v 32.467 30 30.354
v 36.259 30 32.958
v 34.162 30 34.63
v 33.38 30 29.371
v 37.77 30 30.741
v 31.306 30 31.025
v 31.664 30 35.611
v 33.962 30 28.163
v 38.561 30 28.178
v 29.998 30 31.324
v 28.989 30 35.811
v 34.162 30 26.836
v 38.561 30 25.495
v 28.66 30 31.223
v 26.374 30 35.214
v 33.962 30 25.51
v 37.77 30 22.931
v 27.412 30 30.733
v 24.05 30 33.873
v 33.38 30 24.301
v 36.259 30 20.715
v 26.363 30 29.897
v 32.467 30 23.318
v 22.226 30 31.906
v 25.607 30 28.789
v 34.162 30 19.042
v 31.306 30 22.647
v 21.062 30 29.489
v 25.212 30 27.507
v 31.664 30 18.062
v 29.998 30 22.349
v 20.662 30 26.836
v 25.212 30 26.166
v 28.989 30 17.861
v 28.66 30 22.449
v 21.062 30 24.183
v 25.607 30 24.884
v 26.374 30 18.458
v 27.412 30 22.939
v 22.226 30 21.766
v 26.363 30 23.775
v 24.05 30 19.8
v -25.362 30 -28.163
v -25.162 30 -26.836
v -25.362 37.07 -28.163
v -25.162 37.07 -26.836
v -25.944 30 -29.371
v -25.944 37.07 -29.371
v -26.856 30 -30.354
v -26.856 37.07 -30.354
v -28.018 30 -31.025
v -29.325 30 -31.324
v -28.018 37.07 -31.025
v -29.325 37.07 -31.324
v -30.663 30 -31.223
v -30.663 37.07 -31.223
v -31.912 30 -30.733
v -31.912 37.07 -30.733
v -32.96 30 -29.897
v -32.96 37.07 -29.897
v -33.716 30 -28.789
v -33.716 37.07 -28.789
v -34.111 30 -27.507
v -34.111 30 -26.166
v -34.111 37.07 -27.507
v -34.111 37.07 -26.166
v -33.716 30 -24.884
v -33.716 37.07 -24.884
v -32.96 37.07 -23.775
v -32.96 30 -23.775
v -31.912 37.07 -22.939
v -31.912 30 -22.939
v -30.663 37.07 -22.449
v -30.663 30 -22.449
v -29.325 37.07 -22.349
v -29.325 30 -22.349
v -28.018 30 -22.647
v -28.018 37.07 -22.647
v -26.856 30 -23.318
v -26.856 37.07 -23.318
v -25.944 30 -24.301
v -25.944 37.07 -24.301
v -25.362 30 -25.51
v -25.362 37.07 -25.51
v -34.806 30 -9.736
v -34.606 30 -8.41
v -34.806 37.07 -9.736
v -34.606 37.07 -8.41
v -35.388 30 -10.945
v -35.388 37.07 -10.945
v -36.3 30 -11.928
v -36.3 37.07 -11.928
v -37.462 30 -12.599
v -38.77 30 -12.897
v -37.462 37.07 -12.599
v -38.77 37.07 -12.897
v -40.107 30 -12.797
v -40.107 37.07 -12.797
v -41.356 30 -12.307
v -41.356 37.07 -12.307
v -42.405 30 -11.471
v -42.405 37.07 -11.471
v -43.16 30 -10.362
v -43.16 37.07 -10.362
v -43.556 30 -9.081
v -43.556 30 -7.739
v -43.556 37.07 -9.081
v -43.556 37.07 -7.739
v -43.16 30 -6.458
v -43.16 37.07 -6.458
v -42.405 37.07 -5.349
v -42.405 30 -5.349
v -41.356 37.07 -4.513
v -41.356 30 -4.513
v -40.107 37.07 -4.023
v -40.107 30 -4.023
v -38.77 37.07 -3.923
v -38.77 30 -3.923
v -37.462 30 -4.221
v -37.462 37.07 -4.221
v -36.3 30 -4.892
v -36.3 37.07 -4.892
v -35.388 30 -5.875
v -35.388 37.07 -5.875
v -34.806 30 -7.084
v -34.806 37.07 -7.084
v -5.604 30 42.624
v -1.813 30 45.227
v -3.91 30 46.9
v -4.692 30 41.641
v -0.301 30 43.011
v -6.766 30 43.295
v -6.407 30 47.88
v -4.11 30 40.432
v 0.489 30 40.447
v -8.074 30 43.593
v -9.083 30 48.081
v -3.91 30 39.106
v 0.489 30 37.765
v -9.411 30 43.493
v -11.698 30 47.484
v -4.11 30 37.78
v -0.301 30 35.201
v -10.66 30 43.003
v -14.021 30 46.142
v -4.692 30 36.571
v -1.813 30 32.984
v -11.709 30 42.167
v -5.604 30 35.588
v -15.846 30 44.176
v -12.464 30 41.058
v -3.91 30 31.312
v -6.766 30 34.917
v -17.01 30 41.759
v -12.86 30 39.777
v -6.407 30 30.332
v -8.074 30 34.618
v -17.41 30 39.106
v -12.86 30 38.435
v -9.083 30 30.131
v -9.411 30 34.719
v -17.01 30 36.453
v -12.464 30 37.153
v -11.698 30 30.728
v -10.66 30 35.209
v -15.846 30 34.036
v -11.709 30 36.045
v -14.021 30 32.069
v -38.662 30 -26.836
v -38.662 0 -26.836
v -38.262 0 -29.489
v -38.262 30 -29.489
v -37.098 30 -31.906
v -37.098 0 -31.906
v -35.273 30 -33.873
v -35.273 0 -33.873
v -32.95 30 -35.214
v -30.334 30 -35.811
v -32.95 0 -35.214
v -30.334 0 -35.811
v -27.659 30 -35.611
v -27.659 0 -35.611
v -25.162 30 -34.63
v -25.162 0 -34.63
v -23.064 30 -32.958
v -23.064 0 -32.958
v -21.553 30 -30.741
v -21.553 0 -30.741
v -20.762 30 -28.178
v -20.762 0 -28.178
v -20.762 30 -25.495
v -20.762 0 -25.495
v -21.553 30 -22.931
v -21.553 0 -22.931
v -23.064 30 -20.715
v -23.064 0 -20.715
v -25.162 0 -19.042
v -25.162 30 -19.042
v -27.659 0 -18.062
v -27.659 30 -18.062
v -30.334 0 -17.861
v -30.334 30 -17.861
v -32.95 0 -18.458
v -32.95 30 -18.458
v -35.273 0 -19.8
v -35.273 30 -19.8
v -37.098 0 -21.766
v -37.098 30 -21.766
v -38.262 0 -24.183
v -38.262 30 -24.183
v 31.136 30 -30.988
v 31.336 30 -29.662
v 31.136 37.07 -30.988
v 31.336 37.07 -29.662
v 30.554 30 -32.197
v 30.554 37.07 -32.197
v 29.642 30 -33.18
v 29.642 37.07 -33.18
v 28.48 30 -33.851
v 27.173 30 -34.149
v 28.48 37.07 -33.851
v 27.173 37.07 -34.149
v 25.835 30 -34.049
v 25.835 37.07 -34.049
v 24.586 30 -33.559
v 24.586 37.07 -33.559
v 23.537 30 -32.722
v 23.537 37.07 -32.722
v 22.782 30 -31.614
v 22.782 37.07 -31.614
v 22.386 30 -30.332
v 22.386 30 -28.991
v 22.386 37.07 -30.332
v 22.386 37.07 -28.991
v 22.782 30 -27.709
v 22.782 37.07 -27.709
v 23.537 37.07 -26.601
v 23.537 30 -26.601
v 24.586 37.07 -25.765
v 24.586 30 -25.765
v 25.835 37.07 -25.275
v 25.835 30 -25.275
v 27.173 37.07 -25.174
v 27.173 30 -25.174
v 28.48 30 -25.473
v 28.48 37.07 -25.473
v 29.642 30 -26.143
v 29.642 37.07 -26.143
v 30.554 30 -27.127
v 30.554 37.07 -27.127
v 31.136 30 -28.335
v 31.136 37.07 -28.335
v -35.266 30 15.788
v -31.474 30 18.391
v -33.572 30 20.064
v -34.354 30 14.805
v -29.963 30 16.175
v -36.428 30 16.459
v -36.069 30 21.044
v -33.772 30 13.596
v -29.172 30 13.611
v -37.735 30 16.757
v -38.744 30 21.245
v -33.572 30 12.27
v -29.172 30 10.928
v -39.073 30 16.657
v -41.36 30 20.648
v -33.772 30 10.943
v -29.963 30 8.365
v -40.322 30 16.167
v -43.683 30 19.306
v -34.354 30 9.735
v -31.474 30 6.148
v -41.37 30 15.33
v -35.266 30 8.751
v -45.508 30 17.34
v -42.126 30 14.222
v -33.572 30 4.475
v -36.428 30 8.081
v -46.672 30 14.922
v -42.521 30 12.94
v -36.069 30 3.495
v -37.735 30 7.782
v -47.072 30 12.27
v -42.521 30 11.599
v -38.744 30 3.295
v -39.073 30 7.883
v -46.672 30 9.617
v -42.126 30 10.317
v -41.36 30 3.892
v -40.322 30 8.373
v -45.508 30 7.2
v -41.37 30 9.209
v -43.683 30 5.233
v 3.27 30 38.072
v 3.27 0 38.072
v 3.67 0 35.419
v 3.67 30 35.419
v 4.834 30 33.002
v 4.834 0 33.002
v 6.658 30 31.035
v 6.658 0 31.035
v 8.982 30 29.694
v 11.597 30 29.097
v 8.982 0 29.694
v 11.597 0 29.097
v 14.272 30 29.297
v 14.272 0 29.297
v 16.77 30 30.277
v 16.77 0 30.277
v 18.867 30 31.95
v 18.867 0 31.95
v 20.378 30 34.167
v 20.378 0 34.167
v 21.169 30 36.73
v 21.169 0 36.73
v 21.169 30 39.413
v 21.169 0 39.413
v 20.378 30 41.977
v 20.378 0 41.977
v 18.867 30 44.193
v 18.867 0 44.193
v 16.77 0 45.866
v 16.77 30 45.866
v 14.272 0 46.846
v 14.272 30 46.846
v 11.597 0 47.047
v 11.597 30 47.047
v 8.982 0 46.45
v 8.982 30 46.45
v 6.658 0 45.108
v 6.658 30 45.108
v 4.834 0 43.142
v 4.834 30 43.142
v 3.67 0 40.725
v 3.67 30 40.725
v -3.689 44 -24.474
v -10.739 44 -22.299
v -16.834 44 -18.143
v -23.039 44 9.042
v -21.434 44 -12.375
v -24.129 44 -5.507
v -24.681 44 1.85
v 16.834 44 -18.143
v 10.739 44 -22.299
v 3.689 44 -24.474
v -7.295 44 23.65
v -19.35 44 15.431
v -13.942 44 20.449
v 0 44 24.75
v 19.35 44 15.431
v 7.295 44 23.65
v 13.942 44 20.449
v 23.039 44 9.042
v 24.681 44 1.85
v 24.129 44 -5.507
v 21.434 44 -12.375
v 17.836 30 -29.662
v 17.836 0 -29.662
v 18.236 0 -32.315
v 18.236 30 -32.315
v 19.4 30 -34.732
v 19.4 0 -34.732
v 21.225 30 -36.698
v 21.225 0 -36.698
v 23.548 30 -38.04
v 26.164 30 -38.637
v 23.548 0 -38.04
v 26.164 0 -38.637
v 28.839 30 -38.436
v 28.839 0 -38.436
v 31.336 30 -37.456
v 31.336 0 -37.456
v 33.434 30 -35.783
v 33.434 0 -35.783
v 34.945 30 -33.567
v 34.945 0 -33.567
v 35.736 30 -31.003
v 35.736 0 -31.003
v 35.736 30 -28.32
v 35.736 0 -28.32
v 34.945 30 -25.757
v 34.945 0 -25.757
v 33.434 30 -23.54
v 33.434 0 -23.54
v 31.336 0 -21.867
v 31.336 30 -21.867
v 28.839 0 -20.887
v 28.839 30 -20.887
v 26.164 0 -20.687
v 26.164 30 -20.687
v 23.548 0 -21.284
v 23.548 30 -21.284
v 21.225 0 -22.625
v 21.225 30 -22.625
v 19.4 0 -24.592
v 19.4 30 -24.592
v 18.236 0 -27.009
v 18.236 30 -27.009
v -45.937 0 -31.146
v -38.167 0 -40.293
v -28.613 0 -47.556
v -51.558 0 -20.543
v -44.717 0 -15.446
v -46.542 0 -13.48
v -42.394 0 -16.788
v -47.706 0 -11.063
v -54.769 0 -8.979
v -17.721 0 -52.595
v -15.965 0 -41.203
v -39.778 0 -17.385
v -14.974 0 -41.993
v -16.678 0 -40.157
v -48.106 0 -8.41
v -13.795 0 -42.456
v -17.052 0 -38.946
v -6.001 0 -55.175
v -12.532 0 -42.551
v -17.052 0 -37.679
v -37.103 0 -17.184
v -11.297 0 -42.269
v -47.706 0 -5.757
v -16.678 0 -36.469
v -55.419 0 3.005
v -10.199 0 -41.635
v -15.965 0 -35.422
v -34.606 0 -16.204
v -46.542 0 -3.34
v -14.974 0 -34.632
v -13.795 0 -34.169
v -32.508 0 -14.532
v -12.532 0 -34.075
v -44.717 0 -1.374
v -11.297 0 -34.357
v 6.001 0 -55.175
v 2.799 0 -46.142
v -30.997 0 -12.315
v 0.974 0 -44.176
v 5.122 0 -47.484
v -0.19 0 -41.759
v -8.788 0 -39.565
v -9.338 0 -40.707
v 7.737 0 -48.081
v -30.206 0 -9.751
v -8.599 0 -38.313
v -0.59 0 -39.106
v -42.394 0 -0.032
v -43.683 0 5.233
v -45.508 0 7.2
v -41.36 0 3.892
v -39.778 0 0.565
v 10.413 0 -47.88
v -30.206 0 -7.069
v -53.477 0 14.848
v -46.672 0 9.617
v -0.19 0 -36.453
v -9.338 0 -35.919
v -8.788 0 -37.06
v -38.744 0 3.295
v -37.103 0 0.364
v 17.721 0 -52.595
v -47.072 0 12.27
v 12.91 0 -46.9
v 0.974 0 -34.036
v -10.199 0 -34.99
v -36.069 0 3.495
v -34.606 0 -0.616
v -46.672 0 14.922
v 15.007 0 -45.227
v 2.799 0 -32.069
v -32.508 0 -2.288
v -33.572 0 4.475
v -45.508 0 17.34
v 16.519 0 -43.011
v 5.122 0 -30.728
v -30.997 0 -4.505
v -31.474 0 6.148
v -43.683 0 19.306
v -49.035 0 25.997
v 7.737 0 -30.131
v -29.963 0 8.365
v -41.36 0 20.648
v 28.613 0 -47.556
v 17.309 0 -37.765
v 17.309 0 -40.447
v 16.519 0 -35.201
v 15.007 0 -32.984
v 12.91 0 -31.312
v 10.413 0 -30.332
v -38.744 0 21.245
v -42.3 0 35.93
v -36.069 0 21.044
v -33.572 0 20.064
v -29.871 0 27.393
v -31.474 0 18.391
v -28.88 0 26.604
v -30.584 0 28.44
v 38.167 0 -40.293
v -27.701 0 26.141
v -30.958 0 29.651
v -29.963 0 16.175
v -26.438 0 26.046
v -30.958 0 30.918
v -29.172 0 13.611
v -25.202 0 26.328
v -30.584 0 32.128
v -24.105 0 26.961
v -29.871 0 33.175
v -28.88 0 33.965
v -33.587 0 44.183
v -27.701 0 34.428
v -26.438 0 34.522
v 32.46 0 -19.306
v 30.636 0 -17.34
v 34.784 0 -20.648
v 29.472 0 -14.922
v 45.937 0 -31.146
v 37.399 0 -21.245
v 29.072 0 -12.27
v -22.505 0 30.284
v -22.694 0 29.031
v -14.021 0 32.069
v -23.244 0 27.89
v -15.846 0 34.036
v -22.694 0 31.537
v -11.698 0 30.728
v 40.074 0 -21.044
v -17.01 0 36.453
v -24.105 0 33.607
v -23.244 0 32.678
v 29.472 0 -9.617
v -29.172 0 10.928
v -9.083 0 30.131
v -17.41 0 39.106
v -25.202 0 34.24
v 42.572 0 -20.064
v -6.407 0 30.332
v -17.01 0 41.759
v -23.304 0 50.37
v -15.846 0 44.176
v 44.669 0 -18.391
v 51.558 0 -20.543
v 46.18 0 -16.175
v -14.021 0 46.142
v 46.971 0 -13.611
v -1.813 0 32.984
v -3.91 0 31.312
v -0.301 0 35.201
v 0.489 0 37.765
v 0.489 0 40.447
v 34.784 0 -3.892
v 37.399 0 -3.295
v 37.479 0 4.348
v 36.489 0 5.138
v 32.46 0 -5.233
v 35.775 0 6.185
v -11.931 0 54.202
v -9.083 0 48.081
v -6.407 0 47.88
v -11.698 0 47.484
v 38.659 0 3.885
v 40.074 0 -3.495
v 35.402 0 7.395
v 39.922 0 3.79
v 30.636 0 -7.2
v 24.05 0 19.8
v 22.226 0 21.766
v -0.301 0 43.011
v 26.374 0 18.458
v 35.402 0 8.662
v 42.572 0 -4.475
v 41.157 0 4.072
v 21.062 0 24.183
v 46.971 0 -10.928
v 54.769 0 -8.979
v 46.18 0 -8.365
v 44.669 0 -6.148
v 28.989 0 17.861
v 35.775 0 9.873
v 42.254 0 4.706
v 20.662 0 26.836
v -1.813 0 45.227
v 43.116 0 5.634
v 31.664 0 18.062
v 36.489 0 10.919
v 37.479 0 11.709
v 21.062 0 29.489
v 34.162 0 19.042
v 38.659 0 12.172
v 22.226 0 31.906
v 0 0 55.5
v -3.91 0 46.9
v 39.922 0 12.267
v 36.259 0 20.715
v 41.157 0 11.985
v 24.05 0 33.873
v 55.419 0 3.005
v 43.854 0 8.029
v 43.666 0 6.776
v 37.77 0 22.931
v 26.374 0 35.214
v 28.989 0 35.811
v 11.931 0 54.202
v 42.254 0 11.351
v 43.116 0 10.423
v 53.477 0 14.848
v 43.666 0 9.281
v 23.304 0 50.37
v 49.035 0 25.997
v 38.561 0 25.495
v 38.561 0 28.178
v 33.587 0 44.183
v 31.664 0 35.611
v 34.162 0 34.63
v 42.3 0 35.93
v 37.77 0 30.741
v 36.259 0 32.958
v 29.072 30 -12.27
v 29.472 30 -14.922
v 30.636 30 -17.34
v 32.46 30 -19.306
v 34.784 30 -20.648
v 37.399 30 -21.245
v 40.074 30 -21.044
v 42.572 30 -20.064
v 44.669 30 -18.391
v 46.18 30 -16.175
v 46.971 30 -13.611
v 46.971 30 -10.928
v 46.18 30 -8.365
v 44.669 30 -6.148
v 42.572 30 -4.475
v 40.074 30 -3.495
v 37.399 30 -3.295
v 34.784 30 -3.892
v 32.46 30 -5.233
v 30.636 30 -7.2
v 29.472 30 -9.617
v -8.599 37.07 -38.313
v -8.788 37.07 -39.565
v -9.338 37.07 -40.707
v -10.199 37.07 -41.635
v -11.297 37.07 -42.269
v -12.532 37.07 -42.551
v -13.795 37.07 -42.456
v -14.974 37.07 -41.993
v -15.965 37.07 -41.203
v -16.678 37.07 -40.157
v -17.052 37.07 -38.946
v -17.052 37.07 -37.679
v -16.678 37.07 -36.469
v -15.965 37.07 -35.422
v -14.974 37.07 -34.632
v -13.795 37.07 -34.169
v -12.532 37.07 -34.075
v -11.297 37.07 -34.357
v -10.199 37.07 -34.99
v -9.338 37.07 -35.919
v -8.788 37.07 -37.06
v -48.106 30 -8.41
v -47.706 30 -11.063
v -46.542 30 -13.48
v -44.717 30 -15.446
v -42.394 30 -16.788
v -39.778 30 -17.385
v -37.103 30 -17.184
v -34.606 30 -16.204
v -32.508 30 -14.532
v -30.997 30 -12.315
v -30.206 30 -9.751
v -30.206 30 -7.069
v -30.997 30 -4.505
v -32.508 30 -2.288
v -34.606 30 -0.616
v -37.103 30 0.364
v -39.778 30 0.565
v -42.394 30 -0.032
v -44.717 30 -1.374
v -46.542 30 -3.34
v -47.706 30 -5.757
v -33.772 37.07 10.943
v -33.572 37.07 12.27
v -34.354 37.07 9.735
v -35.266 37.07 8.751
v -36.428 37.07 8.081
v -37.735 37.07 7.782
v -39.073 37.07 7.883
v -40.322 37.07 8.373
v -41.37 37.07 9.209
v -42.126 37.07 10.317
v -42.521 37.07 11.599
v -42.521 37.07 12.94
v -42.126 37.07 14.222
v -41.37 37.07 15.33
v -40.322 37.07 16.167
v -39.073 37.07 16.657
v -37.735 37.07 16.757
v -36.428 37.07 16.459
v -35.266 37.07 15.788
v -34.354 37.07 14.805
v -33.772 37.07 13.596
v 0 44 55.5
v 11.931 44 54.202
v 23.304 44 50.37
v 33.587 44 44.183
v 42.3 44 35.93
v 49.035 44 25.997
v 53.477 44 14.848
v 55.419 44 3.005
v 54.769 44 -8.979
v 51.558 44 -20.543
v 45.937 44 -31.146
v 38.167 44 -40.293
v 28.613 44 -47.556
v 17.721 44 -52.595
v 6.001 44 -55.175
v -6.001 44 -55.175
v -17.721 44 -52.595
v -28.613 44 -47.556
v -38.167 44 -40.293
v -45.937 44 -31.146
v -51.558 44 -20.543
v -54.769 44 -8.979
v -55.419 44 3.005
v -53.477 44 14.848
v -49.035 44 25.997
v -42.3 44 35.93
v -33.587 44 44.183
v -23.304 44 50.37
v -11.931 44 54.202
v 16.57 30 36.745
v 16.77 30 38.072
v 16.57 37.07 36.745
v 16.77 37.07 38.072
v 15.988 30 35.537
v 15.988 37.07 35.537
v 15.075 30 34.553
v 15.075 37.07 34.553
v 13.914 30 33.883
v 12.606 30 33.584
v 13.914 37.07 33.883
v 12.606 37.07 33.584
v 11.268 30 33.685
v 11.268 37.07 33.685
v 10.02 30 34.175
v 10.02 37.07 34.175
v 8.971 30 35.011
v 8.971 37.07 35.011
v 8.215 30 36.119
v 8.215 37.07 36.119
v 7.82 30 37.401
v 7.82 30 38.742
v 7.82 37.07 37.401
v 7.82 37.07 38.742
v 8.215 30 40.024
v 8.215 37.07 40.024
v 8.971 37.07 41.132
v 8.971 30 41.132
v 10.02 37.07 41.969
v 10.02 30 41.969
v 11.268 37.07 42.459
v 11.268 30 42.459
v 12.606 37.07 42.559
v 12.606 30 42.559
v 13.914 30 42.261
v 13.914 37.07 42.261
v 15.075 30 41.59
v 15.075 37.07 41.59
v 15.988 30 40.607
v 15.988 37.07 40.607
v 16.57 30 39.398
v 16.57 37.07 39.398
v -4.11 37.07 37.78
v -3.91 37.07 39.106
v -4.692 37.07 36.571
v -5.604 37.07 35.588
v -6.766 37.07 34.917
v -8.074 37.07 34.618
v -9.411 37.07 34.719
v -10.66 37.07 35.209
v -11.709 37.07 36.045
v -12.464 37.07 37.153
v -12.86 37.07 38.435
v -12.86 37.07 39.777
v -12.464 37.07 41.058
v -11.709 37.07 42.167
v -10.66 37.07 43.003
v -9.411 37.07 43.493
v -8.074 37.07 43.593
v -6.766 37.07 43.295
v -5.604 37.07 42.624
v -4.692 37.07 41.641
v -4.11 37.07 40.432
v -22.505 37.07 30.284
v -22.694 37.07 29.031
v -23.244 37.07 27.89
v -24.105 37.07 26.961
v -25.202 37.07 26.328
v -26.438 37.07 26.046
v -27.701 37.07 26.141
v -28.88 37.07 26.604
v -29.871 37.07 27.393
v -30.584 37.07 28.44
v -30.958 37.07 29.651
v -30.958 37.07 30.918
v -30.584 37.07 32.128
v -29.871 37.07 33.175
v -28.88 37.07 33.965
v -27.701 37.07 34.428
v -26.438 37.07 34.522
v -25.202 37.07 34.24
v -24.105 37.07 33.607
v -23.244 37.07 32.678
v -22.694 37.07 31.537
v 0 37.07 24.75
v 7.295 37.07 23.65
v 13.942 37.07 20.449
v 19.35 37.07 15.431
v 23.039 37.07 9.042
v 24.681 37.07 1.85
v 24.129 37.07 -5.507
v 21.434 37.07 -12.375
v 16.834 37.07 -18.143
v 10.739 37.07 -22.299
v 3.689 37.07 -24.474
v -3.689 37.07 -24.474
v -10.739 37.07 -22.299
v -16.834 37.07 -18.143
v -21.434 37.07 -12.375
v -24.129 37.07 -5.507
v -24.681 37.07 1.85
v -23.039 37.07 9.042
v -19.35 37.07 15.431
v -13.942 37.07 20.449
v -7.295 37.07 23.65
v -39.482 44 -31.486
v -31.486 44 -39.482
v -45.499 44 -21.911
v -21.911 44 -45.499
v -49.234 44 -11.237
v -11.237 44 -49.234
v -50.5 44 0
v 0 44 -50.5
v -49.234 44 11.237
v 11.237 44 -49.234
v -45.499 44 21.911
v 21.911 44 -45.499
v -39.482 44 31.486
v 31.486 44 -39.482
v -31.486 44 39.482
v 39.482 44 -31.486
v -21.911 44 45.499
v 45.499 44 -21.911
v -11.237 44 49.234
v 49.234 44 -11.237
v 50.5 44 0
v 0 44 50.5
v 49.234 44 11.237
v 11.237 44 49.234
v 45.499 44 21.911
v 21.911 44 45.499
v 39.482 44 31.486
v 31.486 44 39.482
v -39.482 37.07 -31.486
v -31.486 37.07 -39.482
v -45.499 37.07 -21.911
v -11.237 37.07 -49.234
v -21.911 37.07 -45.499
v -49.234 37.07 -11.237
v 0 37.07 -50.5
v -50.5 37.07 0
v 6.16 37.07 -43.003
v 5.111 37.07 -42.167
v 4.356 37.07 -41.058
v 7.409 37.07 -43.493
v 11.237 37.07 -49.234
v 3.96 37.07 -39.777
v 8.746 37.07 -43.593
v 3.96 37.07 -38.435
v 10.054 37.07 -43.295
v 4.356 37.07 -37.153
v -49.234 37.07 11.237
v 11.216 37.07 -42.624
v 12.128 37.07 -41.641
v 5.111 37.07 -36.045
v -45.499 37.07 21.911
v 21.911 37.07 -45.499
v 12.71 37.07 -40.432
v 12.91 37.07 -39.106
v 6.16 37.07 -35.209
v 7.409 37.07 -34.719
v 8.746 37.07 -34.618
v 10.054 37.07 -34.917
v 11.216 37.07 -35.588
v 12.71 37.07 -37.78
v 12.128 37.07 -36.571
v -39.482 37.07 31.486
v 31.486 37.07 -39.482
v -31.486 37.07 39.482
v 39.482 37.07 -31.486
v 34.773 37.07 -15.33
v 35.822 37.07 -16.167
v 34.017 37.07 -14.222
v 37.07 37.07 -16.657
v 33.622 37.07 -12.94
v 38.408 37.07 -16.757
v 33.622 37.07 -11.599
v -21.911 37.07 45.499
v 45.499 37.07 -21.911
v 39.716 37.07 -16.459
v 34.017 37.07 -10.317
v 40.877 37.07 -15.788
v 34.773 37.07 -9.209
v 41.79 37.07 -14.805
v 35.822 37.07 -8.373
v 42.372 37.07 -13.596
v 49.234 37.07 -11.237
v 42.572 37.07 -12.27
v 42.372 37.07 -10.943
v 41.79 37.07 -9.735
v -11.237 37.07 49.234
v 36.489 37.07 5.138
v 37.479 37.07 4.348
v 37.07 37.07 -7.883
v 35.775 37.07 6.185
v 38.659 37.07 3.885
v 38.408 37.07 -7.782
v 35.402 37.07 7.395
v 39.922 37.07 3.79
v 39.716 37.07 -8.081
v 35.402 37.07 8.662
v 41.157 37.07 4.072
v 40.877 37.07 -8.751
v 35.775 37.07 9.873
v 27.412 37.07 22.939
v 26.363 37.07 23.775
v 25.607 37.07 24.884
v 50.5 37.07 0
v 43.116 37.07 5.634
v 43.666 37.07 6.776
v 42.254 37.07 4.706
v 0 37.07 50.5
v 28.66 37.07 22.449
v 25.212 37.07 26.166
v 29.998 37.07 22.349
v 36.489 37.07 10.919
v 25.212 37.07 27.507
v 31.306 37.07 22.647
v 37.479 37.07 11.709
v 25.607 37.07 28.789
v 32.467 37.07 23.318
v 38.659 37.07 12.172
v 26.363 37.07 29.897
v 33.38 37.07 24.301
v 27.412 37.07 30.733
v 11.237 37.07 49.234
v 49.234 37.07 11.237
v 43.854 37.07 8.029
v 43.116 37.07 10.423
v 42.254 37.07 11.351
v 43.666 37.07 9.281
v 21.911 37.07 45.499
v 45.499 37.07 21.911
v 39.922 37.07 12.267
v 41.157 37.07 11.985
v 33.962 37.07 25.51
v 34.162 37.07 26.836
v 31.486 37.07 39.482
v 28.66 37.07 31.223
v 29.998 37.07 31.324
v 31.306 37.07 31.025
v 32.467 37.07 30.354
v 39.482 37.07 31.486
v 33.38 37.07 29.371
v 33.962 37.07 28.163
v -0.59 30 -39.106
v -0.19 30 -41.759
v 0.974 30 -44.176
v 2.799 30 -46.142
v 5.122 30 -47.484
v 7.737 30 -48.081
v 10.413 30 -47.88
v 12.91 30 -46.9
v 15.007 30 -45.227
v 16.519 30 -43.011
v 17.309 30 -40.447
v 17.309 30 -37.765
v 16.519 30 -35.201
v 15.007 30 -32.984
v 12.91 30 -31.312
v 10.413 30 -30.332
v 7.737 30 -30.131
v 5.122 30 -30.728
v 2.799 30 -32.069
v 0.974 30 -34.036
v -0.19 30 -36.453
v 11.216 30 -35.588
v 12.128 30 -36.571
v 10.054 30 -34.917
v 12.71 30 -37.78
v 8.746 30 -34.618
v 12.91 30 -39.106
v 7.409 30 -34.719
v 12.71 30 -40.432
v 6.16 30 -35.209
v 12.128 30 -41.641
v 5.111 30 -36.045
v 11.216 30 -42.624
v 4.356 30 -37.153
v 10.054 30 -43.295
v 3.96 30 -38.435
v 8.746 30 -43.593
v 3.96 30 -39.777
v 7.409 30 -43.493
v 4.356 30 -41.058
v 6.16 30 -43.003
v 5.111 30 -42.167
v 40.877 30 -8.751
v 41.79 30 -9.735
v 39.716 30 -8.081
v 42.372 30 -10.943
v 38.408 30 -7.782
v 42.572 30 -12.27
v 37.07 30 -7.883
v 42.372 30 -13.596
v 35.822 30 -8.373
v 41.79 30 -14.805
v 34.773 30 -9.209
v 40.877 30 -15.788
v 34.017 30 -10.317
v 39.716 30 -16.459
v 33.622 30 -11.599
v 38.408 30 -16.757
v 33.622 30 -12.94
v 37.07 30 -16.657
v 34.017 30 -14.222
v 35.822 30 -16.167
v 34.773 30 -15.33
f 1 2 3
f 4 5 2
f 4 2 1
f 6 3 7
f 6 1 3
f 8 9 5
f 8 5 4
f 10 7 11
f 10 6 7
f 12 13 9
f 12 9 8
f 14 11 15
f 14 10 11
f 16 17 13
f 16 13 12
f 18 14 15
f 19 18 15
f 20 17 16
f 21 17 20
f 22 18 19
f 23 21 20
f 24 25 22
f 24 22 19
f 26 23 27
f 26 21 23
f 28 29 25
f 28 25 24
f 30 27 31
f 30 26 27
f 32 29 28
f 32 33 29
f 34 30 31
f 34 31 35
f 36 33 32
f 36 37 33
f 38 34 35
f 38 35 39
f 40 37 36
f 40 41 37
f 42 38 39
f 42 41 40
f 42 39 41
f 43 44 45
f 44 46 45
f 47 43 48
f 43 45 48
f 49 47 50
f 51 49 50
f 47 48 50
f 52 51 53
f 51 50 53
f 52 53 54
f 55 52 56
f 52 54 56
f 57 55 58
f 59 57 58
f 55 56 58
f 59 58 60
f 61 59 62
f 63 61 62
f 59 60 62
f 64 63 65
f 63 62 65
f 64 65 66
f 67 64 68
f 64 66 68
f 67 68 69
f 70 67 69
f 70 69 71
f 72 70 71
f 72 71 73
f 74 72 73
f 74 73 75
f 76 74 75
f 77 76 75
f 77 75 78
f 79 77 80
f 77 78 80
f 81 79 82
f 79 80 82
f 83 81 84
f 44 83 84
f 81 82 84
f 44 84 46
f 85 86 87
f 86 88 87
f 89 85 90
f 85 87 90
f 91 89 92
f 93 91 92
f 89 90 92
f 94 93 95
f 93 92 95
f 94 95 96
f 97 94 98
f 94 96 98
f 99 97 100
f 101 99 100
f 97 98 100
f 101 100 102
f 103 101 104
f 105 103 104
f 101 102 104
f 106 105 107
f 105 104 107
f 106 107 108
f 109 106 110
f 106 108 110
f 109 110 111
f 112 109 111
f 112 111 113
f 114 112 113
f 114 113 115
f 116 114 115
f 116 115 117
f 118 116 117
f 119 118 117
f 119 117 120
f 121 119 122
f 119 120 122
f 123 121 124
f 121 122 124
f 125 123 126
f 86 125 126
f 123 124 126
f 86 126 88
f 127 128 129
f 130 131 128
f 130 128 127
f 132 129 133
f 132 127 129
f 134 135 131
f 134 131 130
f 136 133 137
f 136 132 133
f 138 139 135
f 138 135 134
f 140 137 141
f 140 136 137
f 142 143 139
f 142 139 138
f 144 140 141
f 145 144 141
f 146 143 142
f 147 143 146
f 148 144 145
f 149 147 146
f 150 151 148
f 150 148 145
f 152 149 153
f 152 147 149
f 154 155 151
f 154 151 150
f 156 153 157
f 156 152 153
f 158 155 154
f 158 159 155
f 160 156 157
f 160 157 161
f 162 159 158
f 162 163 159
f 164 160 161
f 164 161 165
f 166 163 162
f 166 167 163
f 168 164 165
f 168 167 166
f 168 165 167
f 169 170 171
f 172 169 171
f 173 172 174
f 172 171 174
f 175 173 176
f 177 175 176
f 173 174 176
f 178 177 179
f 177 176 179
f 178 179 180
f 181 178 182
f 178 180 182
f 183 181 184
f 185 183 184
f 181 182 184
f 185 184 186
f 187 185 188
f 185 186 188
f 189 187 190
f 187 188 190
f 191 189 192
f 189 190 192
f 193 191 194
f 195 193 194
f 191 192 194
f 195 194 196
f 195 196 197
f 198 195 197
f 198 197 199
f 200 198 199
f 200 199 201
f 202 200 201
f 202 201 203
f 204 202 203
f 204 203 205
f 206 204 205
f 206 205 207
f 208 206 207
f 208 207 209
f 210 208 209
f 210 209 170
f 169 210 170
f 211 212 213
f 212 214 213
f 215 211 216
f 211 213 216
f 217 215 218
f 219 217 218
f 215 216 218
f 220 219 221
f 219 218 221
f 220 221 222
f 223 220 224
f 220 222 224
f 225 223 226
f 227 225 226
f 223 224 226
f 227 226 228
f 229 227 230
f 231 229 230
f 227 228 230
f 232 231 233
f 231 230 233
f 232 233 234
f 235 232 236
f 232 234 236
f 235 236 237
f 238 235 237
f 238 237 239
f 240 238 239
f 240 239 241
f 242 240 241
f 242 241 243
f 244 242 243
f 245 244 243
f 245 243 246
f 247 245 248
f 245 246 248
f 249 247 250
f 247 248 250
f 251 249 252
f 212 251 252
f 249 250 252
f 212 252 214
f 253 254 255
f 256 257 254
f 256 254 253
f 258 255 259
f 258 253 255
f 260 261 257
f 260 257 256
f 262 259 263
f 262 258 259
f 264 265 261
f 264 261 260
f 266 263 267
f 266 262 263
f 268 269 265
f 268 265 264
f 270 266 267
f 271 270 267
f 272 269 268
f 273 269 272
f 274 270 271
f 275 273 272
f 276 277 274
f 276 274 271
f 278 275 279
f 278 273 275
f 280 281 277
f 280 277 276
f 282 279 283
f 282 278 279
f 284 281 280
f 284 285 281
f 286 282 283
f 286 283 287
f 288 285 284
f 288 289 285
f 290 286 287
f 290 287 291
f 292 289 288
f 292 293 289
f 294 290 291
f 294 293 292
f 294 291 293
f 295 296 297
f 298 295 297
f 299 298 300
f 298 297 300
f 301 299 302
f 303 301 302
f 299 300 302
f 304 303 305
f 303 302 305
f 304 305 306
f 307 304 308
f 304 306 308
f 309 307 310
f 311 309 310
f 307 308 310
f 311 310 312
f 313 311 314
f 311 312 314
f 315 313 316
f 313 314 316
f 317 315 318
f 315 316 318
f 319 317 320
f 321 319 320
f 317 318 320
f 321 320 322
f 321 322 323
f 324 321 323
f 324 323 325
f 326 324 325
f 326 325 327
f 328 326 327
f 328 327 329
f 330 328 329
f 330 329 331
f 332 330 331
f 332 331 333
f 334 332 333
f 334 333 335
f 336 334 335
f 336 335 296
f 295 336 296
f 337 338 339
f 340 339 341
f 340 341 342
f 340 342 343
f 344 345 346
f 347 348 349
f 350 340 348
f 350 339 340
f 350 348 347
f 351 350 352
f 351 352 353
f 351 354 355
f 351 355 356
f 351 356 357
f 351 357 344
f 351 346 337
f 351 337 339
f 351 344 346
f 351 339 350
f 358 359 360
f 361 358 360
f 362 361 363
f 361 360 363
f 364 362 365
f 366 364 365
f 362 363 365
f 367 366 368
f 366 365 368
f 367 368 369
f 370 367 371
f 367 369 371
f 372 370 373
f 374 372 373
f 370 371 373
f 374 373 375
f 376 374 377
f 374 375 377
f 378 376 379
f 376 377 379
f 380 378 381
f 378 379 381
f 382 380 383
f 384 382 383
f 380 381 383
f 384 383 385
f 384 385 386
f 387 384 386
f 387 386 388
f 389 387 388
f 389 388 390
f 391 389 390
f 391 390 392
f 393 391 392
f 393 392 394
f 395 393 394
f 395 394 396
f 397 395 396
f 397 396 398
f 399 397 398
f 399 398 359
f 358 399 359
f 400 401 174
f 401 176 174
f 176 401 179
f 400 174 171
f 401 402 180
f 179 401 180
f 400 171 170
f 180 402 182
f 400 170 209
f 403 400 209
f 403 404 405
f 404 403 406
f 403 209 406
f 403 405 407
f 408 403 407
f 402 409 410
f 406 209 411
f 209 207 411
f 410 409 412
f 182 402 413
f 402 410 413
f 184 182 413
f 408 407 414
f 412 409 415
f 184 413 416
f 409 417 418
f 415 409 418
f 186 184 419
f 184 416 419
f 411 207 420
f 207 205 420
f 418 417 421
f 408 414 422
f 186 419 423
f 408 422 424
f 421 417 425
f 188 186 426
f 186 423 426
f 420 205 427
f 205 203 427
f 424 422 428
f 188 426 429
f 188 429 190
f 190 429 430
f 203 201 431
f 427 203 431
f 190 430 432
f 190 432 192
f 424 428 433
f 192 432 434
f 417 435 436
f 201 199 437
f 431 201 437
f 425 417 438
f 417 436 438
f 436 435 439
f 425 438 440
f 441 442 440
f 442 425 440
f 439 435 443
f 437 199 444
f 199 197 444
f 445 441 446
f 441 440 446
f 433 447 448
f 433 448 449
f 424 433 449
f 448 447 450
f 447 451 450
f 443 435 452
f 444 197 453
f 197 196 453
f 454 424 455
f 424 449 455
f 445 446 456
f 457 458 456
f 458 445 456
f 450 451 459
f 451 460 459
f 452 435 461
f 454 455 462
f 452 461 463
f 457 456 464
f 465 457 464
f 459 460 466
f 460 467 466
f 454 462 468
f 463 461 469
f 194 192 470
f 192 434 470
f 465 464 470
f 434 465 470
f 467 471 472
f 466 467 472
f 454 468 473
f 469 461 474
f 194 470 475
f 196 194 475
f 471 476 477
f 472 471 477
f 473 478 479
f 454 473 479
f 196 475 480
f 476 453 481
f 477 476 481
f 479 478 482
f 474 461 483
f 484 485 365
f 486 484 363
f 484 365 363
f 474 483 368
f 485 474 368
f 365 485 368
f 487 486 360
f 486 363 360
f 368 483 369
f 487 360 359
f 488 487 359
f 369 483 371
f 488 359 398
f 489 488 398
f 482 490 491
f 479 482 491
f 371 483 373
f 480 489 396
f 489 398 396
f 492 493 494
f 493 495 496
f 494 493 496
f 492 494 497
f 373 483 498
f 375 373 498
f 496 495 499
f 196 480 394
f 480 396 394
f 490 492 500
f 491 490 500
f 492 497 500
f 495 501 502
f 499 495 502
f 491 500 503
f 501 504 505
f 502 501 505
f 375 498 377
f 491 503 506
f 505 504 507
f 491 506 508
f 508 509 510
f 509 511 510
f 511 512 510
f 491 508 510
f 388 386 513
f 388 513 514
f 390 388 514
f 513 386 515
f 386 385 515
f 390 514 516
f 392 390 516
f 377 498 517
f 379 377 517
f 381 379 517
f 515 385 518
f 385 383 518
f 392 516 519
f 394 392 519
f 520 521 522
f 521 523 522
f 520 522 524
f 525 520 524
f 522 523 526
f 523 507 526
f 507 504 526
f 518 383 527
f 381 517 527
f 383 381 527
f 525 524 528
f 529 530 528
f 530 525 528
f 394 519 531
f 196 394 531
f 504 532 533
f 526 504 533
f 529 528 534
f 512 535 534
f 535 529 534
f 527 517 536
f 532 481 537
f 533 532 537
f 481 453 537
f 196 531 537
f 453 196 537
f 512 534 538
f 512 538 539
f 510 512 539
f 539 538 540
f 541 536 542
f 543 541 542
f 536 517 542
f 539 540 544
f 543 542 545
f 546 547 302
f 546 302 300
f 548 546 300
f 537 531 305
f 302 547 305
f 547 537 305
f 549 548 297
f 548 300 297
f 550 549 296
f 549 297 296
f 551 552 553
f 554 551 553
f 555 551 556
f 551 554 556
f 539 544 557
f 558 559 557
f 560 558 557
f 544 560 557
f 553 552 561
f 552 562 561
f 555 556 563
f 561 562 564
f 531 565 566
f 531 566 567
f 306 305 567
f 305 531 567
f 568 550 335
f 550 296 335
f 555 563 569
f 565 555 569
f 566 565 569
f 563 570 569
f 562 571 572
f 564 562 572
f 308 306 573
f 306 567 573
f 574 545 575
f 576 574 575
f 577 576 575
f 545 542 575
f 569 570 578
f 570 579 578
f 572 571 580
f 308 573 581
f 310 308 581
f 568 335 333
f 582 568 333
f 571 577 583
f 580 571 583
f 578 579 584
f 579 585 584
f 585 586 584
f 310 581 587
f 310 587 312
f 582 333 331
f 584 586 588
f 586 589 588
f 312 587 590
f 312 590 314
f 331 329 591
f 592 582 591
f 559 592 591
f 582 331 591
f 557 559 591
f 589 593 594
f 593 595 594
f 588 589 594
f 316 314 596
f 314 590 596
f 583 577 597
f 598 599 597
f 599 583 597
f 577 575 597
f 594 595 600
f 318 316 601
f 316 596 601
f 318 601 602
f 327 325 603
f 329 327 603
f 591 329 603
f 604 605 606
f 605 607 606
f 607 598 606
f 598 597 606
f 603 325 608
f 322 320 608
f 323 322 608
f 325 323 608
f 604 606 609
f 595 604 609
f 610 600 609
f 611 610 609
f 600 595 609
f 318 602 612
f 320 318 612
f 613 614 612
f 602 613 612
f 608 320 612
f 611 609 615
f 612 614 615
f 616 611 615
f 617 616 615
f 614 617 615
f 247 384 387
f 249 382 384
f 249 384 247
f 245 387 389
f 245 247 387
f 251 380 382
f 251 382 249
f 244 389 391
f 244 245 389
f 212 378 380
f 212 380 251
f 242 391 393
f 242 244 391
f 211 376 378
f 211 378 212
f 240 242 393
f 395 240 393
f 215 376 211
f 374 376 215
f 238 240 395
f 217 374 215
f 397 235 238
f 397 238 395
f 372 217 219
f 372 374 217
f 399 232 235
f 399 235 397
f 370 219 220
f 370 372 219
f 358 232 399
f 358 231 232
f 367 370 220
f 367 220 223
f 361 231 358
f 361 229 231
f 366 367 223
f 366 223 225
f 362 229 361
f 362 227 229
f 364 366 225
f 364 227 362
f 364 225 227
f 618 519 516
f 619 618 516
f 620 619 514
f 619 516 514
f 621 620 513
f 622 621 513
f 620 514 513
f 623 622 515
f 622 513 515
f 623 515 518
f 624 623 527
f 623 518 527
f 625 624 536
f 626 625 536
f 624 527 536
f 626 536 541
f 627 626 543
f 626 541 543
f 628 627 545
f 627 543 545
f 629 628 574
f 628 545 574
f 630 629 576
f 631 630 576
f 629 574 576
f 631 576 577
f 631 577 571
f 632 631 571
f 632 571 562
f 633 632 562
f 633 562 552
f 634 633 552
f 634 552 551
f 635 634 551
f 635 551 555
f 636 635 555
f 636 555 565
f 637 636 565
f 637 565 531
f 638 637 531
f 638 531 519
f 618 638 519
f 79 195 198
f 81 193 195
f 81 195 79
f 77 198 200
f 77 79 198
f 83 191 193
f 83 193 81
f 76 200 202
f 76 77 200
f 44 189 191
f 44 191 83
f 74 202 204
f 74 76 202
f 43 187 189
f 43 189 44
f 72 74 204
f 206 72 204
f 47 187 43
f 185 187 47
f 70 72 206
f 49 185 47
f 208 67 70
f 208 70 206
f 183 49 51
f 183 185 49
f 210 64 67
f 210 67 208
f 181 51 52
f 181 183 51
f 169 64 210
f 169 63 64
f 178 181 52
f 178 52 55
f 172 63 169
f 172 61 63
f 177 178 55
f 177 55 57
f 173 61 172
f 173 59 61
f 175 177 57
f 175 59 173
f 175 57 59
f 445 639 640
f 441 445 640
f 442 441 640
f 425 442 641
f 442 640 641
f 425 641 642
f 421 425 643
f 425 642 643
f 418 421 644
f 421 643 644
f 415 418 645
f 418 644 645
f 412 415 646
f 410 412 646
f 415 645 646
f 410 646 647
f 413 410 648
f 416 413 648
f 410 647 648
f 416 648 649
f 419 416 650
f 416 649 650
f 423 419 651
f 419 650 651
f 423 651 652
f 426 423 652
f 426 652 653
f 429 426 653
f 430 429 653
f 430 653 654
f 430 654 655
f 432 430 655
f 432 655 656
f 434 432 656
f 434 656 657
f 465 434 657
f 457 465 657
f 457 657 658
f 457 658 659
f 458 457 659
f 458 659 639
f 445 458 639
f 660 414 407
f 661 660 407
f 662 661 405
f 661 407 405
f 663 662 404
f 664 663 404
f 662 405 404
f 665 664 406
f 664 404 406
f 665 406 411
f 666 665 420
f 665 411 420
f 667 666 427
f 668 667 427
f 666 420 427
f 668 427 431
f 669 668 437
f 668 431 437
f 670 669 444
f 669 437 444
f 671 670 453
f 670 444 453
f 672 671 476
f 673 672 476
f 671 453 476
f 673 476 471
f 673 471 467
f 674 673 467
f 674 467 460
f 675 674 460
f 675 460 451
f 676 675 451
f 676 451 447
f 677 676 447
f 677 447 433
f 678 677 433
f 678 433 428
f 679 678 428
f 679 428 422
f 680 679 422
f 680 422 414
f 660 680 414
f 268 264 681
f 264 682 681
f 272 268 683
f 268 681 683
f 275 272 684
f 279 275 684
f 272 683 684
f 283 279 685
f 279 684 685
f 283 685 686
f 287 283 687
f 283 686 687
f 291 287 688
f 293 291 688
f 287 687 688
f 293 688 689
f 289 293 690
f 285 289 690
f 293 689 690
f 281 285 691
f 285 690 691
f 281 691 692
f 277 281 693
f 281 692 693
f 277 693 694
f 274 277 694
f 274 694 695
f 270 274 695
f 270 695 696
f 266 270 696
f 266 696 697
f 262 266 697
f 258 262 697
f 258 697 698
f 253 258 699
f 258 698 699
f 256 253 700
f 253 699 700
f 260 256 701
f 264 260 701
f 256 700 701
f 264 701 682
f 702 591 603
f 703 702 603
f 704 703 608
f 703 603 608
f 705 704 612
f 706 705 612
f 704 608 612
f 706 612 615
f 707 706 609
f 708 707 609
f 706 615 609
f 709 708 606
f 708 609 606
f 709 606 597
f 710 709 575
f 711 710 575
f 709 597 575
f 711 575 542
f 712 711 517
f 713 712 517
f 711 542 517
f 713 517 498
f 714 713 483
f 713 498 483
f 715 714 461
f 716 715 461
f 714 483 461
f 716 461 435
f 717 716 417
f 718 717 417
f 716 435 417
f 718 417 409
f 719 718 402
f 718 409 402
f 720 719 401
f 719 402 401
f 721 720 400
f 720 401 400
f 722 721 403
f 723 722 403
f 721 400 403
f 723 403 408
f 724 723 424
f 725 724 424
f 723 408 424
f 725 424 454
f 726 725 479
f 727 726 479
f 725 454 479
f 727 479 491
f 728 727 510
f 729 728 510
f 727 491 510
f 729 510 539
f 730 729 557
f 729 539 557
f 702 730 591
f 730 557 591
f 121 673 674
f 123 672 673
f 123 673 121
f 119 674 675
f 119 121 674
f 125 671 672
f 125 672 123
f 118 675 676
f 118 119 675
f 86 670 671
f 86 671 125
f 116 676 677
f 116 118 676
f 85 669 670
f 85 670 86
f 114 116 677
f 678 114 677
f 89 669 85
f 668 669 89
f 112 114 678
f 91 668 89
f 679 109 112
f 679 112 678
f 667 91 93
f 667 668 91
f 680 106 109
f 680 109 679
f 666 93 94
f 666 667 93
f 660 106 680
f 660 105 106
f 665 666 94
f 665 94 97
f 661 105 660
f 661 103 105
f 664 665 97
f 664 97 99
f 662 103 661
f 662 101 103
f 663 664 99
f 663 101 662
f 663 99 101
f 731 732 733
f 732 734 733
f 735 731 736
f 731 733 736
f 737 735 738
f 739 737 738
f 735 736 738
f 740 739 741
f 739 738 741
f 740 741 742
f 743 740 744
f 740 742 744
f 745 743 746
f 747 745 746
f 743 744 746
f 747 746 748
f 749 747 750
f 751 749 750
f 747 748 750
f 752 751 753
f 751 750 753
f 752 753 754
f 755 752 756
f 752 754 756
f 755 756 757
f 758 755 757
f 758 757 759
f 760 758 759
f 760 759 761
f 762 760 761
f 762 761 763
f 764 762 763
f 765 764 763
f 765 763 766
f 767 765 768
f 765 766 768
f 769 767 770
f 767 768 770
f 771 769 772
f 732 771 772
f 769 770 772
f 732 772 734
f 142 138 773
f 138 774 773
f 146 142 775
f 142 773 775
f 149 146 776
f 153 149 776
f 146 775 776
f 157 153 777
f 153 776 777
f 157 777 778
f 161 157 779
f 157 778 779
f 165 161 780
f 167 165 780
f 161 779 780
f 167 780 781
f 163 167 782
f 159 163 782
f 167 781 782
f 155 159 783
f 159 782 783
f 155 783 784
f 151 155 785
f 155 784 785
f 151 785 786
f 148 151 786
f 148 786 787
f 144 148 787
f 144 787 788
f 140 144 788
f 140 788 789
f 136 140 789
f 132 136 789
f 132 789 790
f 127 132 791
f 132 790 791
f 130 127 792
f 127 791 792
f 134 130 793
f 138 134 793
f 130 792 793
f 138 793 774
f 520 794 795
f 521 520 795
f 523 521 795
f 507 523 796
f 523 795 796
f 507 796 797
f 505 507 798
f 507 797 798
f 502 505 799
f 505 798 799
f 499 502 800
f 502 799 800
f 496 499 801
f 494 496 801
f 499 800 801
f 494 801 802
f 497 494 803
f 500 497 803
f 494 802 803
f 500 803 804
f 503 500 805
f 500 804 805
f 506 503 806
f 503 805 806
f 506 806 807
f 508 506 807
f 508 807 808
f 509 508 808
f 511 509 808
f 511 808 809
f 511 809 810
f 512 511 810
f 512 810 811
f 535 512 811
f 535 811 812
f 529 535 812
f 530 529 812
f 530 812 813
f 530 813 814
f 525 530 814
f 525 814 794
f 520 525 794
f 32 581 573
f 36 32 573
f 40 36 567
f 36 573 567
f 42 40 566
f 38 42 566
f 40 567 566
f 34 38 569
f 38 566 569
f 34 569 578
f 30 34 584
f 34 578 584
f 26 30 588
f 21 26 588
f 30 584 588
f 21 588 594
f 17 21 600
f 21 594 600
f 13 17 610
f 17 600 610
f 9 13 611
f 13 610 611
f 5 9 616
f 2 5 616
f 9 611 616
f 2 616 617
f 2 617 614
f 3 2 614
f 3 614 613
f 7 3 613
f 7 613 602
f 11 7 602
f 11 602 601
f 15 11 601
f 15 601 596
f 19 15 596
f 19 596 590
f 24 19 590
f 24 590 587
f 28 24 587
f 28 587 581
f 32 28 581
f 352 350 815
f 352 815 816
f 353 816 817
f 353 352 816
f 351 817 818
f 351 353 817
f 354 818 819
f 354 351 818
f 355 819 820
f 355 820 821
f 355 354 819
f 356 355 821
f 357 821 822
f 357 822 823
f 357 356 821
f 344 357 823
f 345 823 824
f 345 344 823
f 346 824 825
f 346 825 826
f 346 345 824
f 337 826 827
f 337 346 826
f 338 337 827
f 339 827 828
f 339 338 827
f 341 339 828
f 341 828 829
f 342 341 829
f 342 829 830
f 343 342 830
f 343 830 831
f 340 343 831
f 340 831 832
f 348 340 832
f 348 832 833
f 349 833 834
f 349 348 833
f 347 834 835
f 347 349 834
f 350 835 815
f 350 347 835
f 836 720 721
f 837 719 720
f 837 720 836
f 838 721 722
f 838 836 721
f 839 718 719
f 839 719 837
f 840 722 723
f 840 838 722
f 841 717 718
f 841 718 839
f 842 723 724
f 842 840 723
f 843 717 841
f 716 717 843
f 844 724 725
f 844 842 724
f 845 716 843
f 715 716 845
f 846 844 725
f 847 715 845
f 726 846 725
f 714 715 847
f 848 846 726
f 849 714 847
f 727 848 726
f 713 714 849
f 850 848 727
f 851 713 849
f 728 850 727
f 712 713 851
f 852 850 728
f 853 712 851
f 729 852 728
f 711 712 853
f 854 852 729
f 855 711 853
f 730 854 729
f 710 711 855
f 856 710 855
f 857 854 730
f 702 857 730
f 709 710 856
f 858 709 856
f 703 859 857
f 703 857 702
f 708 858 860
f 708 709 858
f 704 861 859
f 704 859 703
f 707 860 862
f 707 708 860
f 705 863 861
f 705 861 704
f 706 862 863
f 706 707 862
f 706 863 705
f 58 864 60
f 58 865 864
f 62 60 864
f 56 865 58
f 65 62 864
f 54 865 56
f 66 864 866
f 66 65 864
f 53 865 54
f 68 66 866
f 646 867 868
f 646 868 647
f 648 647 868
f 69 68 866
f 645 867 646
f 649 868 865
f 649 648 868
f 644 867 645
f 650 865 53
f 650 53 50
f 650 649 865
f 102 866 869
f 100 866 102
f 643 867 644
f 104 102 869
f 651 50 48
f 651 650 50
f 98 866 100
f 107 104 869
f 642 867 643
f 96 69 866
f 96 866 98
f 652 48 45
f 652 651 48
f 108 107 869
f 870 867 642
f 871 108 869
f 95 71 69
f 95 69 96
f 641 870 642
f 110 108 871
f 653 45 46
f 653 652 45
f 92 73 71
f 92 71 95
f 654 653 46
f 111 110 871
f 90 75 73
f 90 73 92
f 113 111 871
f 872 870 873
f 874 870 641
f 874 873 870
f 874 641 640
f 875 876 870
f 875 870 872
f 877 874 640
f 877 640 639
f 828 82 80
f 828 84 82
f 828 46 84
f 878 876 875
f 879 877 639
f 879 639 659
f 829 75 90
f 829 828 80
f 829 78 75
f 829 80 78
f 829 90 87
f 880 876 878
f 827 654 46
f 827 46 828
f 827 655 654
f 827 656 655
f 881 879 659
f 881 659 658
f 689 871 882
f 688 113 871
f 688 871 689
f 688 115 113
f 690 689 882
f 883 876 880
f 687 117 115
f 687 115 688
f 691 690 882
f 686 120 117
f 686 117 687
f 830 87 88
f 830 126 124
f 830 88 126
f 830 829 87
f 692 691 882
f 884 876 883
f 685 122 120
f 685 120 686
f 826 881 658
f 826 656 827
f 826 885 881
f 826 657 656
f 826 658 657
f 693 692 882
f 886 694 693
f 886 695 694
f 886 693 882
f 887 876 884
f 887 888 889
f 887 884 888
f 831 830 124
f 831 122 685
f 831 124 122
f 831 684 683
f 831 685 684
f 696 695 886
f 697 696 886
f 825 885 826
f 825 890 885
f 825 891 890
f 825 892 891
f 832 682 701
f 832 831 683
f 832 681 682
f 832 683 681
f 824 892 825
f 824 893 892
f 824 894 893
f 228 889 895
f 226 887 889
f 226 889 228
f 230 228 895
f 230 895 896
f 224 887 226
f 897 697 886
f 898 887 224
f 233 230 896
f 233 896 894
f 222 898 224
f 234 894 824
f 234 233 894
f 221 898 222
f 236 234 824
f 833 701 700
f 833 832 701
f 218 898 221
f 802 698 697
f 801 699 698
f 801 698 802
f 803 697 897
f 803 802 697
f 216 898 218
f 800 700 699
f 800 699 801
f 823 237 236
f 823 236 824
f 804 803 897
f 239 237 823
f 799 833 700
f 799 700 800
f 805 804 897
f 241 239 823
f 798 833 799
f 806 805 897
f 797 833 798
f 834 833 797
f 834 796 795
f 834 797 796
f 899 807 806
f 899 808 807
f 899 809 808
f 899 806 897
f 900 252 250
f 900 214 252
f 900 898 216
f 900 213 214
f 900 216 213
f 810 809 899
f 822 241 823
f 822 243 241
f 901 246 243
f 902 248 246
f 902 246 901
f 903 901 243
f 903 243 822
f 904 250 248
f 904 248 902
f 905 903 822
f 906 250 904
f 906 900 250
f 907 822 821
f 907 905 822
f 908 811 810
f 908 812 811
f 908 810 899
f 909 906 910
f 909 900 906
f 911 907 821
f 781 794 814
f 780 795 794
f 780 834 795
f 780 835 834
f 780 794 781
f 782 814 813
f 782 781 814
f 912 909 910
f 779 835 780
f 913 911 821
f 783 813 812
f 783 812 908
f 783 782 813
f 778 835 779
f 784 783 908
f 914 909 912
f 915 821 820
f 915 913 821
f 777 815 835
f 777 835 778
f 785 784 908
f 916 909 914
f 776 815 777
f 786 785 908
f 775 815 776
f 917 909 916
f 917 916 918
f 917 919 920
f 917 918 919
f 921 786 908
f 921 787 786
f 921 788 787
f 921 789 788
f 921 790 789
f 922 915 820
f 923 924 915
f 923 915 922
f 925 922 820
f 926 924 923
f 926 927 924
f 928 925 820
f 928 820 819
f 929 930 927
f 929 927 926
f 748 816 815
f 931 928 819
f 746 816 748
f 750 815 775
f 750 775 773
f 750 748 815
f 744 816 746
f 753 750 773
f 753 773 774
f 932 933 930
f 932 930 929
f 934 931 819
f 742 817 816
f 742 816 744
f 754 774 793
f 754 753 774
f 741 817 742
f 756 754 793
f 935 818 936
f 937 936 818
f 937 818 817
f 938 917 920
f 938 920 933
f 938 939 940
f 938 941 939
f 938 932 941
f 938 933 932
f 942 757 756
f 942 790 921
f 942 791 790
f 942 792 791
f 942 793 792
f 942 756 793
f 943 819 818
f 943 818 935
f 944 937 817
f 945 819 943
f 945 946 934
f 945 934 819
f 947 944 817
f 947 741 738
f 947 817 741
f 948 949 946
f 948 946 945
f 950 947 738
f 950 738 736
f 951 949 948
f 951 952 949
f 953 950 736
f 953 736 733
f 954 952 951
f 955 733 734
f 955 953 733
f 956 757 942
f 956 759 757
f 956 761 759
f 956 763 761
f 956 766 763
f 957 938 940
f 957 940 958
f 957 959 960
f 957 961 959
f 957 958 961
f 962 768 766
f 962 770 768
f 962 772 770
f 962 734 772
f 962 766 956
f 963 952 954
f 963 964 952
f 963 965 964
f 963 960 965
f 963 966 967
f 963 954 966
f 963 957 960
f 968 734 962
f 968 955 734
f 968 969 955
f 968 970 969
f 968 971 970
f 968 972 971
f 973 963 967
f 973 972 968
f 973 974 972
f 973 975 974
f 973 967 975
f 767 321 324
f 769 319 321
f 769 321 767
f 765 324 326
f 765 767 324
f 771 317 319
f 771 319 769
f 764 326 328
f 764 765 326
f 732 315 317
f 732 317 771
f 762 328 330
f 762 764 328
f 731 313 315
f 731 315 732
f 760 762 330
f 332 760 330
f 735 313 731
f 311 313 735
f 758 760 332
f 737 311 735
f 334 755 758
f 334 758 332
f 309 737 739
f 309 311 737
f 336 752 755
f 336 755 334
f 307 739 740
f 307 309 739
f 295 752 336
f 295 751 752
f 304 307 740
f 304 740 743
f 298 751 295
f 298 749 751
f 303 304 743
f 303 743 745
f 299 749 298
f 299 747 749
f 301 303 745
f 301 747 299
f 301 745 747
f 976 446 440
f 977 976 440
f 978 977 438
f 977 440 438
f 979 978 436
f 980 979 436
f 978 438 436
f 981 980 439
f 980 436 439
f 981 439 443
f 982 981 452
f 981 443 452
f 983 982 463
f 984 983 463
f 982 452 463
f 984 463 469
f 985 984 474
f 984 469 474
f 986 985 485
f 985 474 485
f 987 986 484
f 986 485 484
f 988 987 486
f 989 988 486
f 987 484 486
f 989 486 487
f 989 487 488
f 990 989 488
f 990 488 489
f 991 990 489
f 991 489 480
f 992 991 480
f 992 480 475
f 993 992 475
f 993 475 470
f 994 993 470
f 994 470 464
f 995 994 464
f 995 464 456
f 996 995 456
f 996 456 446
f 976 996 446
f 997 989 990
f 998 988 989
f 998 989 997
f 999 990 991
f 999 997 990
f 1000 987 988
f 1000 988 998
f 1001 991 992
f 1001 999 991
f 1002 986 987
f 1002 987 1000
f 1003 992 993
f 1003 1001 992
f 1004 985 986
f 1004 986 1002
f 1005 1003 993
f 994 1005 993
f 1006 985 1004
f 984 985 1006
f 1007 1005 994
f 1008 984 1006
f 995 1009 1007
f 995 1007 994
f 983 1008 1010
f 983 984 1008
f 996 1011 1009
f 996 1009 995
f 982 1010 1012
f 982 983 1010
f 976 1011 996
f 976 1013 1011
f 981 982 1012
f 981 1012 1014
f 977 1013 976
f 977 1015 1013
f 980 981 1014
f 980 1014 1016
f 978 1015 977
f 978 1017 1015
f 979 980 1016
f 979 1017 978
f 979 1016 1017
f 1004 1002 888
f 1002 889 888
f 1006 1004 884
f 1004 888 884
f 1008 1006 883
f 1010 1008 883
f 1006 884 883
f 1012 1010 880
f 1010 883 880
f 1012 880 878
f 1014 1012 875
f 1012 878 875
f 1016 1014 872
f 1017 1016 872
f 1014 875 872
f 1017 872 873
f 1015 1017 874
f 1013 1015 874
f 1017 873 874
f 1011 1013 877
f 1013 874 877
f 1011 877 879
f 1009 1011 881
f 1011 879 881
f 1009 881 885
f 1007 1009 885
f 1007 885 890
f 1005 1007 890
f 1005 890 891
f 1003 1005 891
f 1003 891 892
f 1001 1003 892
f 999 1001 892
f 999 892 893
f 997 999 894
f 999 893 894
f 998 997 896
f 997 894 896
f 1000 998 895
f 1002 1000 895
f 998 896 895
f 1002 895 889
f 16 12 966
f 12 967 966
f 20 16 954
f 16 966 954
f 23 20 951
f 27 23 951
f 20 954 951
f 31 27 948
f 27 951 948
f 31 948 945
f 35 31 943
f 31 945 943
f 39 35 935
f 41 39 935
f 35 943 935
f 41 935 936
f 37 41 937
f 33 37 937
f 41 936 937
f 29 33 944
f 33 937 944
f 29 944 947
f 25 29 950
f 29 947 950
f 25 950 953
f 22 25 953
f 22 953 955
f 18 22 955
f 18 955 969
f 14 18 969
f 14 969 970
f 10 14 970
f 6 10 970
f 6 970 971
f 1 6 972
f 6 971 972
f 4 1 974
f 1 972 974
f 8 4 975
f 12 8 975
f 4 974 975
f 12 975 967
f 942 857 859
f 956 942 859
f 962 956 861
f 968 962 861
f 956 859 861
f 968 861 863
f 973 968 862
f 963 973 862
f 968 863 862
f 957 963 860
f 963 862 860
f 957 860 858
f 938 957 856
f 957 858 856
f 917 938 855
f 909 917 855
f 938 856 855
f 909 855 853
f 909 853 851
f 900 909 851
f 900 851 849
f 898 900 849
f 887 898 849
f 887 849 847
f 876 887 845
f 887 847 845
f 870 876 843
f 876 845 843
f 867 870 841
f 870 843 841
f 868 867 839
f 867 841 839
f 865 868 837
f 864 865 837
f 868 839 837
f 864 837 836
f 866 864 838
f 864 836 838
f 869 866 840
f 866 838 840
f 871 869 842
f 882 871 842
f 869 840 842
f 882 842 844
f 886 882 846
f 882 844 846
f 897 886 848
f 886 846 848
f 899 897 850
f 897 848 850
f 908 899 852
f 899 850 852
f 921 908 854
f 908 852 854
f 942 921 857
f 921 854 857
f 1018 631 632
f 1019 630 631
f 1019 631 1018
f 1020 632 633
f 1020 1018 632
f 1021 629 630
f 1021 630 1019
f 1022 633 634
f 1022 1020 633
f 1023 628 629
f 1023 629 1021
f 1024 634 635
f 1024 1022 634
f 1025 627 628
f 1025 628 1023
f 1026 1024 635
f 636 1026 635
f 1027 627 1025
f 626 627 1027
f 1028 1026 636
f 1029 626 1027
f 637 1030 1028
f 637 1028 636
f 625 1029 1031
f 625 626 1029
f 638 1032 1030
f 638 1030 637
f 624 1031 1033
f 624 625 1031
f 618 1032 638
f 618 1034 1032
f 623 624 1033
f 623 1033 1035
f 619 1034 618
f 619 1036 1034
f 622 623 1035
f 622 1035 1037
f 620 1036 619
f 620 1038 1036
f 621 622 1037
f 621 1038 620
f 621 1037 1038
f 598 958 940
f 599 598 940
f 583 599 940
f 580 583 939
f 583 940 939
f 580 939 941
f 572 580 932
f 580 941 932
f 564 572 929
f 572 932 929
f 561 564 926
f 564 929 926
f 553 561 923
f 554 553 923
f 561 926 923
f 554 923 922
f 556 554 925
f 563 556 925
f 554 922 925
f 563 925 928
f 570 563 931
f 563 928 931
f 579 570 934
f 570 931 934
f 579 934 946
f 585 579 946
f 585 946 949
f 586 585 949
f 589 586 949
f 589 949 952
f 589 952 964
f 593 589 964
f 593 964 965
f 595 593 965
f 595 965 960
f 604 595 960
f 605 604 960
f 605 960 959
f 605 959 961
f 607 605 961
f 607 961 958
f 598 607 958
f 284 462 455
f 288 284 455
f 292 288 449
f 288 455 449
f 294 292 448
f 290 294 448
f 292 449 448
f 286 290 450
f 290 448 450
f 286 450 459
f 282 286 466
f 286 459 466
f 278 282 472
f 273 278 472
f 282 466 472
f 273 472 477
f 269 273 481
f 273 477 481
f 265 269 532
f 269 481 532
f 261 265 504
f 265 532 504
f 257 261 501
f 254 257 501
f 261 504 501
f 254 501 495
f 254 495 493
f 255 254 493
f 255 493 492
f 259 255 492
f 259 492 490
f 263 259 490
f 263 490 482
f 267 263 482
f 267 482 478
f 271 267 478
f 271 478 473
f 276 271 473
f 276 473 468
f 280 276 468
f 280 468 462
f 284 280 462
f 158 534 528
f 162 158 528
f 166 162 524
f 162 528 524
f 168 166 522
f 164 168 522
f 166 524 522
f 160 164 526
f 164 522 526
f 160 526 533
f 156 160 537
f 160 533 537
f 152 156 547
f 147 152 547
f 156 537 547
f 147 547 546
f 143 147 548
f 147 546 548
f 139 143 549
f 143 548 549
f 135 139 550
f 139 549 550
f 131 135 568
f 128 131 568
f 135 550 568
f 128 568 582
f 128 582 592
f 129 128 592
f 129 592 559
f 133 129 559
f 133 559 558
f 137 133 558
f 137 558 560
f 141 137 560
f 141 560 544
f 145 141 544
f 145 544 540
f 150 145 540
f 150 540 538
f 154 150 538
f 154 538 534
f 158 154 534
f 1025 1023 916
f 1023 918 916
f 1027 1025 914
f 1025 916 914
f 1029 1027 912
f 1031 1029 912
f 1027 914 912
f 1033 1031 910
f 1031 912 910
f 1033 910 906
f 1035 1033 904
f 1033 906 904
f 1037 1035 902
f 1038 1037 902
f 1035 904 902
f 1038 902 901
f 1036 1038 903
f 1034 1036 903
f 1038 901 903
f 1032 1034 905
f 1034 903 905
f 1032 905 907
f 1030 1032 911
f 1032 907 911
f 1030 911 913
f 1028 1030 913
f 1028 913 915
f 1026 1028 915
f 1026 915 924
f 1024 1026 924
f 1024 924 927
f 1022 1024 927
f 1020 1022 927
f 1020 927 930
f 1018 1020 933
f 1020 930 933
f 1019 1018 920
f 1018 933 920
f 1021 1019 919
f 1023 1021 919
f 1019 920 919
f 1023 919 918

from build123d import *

# Parameters (mm, degrees)
CROQUIS1_R                                           = 55.5
SALIENTE_EXTRUIR1_DEPTH                              = 44
CROQUIS2_R                                           = 50.5
CROQUIS2_R_2                                         = 24.75
CORTAR_EXTRUIR2_DEPTH                                = 6.93
REFRENTADO_PARA_TORNILLO_CON_CABEZA_TRON_D           = 9
REFRENTADO_PARA_TORNILLO_CON_CABEZA_TRON_CBORE_D     = 18
REFRENTADO_PARA_TORNILLO_CON_CABEZA_TRON_CBORE_DEPTH = 30
TALADRO_ROSCADO_M10X1_51_D                           = 8.5


with BuildPart() as part:
    # Croquis1 → Saliente-Extruir1 (new body)
    with BuildSketch(Plane(origin=(0, 0, 0), x_dir=(1, 0, 0), z_dir=(0, 1, 0))):
        with Locations(Location((0, 0, 0), (0, 0, 270))):
            Circle(CROQUIS1_R)
    extrude(amount=SALIENTE_EXTRUIR1_DEPTH)

    # Croquis2 → Cortar-Extruir2 (cut)
    with BuildSketch(Plane(origin=(0, 44, 0), x_dir=(1, 0, 0), z_dir=(0, 1, 0))):
        with Locations(Location((0, 0, 0), (0, 0, 270))):
            Circle(CROQUIS2_R)
        with Locations(Location((0, 0, 0), (0, 0, 270))):
            Circle(CROQUIS2_R_2, mode=Mode.SUBTRACT)
    extrude(amount=-CORTAR_EXTRUIR2_DEPTH, mode=Mode.SUBTRACT)

    # Refrentado para tornillo con cabeza troncocónica de M81 (through all)
    with Locations(Plane(origin=(0, 0, 0), x_dir=(-1, 0, 0), z_dir=(0, -1, 0))):
        with Locations((8.40999002, -39.10590835), (-12.269689172, -38.071705079), (-29.661715059, -26.836219178), (-38.071705079, 12.269689172), (-26.836219178, 29.661715059), (-8.40999002, 39.10590835), (29.661715059, 26.836219178), (39.10590835, 8.40999002), (38.071705079, -12.269689172)):
            CounterBoreHole(REFRENTADO_PARA_TORNILLO_CON_CABEZA_TRON_D / 2, REFRENTADO_PARA_TORNILLO_CON_CABEZA_TRON_CBORE_D / 2, REFRENTADO_PARA_TORNILLO_CON_CABEZA_TRON_CBORE_DEPTH)

    # Taladro roscado M10x1.51 (through all)
    with Locations(Plane(origin=(0, 0, 0), x_dir=(-1, 0, 0), z_dir=(0, -1, 0))):
        with Locations((26.755142579, -30.284161629), (-39.604424593, -8.02855234), (12.849282014, 38.31271397)):
            Hole(TALADRO_ROSCADO_M10X1_51_D / 2)


solid = part.part
